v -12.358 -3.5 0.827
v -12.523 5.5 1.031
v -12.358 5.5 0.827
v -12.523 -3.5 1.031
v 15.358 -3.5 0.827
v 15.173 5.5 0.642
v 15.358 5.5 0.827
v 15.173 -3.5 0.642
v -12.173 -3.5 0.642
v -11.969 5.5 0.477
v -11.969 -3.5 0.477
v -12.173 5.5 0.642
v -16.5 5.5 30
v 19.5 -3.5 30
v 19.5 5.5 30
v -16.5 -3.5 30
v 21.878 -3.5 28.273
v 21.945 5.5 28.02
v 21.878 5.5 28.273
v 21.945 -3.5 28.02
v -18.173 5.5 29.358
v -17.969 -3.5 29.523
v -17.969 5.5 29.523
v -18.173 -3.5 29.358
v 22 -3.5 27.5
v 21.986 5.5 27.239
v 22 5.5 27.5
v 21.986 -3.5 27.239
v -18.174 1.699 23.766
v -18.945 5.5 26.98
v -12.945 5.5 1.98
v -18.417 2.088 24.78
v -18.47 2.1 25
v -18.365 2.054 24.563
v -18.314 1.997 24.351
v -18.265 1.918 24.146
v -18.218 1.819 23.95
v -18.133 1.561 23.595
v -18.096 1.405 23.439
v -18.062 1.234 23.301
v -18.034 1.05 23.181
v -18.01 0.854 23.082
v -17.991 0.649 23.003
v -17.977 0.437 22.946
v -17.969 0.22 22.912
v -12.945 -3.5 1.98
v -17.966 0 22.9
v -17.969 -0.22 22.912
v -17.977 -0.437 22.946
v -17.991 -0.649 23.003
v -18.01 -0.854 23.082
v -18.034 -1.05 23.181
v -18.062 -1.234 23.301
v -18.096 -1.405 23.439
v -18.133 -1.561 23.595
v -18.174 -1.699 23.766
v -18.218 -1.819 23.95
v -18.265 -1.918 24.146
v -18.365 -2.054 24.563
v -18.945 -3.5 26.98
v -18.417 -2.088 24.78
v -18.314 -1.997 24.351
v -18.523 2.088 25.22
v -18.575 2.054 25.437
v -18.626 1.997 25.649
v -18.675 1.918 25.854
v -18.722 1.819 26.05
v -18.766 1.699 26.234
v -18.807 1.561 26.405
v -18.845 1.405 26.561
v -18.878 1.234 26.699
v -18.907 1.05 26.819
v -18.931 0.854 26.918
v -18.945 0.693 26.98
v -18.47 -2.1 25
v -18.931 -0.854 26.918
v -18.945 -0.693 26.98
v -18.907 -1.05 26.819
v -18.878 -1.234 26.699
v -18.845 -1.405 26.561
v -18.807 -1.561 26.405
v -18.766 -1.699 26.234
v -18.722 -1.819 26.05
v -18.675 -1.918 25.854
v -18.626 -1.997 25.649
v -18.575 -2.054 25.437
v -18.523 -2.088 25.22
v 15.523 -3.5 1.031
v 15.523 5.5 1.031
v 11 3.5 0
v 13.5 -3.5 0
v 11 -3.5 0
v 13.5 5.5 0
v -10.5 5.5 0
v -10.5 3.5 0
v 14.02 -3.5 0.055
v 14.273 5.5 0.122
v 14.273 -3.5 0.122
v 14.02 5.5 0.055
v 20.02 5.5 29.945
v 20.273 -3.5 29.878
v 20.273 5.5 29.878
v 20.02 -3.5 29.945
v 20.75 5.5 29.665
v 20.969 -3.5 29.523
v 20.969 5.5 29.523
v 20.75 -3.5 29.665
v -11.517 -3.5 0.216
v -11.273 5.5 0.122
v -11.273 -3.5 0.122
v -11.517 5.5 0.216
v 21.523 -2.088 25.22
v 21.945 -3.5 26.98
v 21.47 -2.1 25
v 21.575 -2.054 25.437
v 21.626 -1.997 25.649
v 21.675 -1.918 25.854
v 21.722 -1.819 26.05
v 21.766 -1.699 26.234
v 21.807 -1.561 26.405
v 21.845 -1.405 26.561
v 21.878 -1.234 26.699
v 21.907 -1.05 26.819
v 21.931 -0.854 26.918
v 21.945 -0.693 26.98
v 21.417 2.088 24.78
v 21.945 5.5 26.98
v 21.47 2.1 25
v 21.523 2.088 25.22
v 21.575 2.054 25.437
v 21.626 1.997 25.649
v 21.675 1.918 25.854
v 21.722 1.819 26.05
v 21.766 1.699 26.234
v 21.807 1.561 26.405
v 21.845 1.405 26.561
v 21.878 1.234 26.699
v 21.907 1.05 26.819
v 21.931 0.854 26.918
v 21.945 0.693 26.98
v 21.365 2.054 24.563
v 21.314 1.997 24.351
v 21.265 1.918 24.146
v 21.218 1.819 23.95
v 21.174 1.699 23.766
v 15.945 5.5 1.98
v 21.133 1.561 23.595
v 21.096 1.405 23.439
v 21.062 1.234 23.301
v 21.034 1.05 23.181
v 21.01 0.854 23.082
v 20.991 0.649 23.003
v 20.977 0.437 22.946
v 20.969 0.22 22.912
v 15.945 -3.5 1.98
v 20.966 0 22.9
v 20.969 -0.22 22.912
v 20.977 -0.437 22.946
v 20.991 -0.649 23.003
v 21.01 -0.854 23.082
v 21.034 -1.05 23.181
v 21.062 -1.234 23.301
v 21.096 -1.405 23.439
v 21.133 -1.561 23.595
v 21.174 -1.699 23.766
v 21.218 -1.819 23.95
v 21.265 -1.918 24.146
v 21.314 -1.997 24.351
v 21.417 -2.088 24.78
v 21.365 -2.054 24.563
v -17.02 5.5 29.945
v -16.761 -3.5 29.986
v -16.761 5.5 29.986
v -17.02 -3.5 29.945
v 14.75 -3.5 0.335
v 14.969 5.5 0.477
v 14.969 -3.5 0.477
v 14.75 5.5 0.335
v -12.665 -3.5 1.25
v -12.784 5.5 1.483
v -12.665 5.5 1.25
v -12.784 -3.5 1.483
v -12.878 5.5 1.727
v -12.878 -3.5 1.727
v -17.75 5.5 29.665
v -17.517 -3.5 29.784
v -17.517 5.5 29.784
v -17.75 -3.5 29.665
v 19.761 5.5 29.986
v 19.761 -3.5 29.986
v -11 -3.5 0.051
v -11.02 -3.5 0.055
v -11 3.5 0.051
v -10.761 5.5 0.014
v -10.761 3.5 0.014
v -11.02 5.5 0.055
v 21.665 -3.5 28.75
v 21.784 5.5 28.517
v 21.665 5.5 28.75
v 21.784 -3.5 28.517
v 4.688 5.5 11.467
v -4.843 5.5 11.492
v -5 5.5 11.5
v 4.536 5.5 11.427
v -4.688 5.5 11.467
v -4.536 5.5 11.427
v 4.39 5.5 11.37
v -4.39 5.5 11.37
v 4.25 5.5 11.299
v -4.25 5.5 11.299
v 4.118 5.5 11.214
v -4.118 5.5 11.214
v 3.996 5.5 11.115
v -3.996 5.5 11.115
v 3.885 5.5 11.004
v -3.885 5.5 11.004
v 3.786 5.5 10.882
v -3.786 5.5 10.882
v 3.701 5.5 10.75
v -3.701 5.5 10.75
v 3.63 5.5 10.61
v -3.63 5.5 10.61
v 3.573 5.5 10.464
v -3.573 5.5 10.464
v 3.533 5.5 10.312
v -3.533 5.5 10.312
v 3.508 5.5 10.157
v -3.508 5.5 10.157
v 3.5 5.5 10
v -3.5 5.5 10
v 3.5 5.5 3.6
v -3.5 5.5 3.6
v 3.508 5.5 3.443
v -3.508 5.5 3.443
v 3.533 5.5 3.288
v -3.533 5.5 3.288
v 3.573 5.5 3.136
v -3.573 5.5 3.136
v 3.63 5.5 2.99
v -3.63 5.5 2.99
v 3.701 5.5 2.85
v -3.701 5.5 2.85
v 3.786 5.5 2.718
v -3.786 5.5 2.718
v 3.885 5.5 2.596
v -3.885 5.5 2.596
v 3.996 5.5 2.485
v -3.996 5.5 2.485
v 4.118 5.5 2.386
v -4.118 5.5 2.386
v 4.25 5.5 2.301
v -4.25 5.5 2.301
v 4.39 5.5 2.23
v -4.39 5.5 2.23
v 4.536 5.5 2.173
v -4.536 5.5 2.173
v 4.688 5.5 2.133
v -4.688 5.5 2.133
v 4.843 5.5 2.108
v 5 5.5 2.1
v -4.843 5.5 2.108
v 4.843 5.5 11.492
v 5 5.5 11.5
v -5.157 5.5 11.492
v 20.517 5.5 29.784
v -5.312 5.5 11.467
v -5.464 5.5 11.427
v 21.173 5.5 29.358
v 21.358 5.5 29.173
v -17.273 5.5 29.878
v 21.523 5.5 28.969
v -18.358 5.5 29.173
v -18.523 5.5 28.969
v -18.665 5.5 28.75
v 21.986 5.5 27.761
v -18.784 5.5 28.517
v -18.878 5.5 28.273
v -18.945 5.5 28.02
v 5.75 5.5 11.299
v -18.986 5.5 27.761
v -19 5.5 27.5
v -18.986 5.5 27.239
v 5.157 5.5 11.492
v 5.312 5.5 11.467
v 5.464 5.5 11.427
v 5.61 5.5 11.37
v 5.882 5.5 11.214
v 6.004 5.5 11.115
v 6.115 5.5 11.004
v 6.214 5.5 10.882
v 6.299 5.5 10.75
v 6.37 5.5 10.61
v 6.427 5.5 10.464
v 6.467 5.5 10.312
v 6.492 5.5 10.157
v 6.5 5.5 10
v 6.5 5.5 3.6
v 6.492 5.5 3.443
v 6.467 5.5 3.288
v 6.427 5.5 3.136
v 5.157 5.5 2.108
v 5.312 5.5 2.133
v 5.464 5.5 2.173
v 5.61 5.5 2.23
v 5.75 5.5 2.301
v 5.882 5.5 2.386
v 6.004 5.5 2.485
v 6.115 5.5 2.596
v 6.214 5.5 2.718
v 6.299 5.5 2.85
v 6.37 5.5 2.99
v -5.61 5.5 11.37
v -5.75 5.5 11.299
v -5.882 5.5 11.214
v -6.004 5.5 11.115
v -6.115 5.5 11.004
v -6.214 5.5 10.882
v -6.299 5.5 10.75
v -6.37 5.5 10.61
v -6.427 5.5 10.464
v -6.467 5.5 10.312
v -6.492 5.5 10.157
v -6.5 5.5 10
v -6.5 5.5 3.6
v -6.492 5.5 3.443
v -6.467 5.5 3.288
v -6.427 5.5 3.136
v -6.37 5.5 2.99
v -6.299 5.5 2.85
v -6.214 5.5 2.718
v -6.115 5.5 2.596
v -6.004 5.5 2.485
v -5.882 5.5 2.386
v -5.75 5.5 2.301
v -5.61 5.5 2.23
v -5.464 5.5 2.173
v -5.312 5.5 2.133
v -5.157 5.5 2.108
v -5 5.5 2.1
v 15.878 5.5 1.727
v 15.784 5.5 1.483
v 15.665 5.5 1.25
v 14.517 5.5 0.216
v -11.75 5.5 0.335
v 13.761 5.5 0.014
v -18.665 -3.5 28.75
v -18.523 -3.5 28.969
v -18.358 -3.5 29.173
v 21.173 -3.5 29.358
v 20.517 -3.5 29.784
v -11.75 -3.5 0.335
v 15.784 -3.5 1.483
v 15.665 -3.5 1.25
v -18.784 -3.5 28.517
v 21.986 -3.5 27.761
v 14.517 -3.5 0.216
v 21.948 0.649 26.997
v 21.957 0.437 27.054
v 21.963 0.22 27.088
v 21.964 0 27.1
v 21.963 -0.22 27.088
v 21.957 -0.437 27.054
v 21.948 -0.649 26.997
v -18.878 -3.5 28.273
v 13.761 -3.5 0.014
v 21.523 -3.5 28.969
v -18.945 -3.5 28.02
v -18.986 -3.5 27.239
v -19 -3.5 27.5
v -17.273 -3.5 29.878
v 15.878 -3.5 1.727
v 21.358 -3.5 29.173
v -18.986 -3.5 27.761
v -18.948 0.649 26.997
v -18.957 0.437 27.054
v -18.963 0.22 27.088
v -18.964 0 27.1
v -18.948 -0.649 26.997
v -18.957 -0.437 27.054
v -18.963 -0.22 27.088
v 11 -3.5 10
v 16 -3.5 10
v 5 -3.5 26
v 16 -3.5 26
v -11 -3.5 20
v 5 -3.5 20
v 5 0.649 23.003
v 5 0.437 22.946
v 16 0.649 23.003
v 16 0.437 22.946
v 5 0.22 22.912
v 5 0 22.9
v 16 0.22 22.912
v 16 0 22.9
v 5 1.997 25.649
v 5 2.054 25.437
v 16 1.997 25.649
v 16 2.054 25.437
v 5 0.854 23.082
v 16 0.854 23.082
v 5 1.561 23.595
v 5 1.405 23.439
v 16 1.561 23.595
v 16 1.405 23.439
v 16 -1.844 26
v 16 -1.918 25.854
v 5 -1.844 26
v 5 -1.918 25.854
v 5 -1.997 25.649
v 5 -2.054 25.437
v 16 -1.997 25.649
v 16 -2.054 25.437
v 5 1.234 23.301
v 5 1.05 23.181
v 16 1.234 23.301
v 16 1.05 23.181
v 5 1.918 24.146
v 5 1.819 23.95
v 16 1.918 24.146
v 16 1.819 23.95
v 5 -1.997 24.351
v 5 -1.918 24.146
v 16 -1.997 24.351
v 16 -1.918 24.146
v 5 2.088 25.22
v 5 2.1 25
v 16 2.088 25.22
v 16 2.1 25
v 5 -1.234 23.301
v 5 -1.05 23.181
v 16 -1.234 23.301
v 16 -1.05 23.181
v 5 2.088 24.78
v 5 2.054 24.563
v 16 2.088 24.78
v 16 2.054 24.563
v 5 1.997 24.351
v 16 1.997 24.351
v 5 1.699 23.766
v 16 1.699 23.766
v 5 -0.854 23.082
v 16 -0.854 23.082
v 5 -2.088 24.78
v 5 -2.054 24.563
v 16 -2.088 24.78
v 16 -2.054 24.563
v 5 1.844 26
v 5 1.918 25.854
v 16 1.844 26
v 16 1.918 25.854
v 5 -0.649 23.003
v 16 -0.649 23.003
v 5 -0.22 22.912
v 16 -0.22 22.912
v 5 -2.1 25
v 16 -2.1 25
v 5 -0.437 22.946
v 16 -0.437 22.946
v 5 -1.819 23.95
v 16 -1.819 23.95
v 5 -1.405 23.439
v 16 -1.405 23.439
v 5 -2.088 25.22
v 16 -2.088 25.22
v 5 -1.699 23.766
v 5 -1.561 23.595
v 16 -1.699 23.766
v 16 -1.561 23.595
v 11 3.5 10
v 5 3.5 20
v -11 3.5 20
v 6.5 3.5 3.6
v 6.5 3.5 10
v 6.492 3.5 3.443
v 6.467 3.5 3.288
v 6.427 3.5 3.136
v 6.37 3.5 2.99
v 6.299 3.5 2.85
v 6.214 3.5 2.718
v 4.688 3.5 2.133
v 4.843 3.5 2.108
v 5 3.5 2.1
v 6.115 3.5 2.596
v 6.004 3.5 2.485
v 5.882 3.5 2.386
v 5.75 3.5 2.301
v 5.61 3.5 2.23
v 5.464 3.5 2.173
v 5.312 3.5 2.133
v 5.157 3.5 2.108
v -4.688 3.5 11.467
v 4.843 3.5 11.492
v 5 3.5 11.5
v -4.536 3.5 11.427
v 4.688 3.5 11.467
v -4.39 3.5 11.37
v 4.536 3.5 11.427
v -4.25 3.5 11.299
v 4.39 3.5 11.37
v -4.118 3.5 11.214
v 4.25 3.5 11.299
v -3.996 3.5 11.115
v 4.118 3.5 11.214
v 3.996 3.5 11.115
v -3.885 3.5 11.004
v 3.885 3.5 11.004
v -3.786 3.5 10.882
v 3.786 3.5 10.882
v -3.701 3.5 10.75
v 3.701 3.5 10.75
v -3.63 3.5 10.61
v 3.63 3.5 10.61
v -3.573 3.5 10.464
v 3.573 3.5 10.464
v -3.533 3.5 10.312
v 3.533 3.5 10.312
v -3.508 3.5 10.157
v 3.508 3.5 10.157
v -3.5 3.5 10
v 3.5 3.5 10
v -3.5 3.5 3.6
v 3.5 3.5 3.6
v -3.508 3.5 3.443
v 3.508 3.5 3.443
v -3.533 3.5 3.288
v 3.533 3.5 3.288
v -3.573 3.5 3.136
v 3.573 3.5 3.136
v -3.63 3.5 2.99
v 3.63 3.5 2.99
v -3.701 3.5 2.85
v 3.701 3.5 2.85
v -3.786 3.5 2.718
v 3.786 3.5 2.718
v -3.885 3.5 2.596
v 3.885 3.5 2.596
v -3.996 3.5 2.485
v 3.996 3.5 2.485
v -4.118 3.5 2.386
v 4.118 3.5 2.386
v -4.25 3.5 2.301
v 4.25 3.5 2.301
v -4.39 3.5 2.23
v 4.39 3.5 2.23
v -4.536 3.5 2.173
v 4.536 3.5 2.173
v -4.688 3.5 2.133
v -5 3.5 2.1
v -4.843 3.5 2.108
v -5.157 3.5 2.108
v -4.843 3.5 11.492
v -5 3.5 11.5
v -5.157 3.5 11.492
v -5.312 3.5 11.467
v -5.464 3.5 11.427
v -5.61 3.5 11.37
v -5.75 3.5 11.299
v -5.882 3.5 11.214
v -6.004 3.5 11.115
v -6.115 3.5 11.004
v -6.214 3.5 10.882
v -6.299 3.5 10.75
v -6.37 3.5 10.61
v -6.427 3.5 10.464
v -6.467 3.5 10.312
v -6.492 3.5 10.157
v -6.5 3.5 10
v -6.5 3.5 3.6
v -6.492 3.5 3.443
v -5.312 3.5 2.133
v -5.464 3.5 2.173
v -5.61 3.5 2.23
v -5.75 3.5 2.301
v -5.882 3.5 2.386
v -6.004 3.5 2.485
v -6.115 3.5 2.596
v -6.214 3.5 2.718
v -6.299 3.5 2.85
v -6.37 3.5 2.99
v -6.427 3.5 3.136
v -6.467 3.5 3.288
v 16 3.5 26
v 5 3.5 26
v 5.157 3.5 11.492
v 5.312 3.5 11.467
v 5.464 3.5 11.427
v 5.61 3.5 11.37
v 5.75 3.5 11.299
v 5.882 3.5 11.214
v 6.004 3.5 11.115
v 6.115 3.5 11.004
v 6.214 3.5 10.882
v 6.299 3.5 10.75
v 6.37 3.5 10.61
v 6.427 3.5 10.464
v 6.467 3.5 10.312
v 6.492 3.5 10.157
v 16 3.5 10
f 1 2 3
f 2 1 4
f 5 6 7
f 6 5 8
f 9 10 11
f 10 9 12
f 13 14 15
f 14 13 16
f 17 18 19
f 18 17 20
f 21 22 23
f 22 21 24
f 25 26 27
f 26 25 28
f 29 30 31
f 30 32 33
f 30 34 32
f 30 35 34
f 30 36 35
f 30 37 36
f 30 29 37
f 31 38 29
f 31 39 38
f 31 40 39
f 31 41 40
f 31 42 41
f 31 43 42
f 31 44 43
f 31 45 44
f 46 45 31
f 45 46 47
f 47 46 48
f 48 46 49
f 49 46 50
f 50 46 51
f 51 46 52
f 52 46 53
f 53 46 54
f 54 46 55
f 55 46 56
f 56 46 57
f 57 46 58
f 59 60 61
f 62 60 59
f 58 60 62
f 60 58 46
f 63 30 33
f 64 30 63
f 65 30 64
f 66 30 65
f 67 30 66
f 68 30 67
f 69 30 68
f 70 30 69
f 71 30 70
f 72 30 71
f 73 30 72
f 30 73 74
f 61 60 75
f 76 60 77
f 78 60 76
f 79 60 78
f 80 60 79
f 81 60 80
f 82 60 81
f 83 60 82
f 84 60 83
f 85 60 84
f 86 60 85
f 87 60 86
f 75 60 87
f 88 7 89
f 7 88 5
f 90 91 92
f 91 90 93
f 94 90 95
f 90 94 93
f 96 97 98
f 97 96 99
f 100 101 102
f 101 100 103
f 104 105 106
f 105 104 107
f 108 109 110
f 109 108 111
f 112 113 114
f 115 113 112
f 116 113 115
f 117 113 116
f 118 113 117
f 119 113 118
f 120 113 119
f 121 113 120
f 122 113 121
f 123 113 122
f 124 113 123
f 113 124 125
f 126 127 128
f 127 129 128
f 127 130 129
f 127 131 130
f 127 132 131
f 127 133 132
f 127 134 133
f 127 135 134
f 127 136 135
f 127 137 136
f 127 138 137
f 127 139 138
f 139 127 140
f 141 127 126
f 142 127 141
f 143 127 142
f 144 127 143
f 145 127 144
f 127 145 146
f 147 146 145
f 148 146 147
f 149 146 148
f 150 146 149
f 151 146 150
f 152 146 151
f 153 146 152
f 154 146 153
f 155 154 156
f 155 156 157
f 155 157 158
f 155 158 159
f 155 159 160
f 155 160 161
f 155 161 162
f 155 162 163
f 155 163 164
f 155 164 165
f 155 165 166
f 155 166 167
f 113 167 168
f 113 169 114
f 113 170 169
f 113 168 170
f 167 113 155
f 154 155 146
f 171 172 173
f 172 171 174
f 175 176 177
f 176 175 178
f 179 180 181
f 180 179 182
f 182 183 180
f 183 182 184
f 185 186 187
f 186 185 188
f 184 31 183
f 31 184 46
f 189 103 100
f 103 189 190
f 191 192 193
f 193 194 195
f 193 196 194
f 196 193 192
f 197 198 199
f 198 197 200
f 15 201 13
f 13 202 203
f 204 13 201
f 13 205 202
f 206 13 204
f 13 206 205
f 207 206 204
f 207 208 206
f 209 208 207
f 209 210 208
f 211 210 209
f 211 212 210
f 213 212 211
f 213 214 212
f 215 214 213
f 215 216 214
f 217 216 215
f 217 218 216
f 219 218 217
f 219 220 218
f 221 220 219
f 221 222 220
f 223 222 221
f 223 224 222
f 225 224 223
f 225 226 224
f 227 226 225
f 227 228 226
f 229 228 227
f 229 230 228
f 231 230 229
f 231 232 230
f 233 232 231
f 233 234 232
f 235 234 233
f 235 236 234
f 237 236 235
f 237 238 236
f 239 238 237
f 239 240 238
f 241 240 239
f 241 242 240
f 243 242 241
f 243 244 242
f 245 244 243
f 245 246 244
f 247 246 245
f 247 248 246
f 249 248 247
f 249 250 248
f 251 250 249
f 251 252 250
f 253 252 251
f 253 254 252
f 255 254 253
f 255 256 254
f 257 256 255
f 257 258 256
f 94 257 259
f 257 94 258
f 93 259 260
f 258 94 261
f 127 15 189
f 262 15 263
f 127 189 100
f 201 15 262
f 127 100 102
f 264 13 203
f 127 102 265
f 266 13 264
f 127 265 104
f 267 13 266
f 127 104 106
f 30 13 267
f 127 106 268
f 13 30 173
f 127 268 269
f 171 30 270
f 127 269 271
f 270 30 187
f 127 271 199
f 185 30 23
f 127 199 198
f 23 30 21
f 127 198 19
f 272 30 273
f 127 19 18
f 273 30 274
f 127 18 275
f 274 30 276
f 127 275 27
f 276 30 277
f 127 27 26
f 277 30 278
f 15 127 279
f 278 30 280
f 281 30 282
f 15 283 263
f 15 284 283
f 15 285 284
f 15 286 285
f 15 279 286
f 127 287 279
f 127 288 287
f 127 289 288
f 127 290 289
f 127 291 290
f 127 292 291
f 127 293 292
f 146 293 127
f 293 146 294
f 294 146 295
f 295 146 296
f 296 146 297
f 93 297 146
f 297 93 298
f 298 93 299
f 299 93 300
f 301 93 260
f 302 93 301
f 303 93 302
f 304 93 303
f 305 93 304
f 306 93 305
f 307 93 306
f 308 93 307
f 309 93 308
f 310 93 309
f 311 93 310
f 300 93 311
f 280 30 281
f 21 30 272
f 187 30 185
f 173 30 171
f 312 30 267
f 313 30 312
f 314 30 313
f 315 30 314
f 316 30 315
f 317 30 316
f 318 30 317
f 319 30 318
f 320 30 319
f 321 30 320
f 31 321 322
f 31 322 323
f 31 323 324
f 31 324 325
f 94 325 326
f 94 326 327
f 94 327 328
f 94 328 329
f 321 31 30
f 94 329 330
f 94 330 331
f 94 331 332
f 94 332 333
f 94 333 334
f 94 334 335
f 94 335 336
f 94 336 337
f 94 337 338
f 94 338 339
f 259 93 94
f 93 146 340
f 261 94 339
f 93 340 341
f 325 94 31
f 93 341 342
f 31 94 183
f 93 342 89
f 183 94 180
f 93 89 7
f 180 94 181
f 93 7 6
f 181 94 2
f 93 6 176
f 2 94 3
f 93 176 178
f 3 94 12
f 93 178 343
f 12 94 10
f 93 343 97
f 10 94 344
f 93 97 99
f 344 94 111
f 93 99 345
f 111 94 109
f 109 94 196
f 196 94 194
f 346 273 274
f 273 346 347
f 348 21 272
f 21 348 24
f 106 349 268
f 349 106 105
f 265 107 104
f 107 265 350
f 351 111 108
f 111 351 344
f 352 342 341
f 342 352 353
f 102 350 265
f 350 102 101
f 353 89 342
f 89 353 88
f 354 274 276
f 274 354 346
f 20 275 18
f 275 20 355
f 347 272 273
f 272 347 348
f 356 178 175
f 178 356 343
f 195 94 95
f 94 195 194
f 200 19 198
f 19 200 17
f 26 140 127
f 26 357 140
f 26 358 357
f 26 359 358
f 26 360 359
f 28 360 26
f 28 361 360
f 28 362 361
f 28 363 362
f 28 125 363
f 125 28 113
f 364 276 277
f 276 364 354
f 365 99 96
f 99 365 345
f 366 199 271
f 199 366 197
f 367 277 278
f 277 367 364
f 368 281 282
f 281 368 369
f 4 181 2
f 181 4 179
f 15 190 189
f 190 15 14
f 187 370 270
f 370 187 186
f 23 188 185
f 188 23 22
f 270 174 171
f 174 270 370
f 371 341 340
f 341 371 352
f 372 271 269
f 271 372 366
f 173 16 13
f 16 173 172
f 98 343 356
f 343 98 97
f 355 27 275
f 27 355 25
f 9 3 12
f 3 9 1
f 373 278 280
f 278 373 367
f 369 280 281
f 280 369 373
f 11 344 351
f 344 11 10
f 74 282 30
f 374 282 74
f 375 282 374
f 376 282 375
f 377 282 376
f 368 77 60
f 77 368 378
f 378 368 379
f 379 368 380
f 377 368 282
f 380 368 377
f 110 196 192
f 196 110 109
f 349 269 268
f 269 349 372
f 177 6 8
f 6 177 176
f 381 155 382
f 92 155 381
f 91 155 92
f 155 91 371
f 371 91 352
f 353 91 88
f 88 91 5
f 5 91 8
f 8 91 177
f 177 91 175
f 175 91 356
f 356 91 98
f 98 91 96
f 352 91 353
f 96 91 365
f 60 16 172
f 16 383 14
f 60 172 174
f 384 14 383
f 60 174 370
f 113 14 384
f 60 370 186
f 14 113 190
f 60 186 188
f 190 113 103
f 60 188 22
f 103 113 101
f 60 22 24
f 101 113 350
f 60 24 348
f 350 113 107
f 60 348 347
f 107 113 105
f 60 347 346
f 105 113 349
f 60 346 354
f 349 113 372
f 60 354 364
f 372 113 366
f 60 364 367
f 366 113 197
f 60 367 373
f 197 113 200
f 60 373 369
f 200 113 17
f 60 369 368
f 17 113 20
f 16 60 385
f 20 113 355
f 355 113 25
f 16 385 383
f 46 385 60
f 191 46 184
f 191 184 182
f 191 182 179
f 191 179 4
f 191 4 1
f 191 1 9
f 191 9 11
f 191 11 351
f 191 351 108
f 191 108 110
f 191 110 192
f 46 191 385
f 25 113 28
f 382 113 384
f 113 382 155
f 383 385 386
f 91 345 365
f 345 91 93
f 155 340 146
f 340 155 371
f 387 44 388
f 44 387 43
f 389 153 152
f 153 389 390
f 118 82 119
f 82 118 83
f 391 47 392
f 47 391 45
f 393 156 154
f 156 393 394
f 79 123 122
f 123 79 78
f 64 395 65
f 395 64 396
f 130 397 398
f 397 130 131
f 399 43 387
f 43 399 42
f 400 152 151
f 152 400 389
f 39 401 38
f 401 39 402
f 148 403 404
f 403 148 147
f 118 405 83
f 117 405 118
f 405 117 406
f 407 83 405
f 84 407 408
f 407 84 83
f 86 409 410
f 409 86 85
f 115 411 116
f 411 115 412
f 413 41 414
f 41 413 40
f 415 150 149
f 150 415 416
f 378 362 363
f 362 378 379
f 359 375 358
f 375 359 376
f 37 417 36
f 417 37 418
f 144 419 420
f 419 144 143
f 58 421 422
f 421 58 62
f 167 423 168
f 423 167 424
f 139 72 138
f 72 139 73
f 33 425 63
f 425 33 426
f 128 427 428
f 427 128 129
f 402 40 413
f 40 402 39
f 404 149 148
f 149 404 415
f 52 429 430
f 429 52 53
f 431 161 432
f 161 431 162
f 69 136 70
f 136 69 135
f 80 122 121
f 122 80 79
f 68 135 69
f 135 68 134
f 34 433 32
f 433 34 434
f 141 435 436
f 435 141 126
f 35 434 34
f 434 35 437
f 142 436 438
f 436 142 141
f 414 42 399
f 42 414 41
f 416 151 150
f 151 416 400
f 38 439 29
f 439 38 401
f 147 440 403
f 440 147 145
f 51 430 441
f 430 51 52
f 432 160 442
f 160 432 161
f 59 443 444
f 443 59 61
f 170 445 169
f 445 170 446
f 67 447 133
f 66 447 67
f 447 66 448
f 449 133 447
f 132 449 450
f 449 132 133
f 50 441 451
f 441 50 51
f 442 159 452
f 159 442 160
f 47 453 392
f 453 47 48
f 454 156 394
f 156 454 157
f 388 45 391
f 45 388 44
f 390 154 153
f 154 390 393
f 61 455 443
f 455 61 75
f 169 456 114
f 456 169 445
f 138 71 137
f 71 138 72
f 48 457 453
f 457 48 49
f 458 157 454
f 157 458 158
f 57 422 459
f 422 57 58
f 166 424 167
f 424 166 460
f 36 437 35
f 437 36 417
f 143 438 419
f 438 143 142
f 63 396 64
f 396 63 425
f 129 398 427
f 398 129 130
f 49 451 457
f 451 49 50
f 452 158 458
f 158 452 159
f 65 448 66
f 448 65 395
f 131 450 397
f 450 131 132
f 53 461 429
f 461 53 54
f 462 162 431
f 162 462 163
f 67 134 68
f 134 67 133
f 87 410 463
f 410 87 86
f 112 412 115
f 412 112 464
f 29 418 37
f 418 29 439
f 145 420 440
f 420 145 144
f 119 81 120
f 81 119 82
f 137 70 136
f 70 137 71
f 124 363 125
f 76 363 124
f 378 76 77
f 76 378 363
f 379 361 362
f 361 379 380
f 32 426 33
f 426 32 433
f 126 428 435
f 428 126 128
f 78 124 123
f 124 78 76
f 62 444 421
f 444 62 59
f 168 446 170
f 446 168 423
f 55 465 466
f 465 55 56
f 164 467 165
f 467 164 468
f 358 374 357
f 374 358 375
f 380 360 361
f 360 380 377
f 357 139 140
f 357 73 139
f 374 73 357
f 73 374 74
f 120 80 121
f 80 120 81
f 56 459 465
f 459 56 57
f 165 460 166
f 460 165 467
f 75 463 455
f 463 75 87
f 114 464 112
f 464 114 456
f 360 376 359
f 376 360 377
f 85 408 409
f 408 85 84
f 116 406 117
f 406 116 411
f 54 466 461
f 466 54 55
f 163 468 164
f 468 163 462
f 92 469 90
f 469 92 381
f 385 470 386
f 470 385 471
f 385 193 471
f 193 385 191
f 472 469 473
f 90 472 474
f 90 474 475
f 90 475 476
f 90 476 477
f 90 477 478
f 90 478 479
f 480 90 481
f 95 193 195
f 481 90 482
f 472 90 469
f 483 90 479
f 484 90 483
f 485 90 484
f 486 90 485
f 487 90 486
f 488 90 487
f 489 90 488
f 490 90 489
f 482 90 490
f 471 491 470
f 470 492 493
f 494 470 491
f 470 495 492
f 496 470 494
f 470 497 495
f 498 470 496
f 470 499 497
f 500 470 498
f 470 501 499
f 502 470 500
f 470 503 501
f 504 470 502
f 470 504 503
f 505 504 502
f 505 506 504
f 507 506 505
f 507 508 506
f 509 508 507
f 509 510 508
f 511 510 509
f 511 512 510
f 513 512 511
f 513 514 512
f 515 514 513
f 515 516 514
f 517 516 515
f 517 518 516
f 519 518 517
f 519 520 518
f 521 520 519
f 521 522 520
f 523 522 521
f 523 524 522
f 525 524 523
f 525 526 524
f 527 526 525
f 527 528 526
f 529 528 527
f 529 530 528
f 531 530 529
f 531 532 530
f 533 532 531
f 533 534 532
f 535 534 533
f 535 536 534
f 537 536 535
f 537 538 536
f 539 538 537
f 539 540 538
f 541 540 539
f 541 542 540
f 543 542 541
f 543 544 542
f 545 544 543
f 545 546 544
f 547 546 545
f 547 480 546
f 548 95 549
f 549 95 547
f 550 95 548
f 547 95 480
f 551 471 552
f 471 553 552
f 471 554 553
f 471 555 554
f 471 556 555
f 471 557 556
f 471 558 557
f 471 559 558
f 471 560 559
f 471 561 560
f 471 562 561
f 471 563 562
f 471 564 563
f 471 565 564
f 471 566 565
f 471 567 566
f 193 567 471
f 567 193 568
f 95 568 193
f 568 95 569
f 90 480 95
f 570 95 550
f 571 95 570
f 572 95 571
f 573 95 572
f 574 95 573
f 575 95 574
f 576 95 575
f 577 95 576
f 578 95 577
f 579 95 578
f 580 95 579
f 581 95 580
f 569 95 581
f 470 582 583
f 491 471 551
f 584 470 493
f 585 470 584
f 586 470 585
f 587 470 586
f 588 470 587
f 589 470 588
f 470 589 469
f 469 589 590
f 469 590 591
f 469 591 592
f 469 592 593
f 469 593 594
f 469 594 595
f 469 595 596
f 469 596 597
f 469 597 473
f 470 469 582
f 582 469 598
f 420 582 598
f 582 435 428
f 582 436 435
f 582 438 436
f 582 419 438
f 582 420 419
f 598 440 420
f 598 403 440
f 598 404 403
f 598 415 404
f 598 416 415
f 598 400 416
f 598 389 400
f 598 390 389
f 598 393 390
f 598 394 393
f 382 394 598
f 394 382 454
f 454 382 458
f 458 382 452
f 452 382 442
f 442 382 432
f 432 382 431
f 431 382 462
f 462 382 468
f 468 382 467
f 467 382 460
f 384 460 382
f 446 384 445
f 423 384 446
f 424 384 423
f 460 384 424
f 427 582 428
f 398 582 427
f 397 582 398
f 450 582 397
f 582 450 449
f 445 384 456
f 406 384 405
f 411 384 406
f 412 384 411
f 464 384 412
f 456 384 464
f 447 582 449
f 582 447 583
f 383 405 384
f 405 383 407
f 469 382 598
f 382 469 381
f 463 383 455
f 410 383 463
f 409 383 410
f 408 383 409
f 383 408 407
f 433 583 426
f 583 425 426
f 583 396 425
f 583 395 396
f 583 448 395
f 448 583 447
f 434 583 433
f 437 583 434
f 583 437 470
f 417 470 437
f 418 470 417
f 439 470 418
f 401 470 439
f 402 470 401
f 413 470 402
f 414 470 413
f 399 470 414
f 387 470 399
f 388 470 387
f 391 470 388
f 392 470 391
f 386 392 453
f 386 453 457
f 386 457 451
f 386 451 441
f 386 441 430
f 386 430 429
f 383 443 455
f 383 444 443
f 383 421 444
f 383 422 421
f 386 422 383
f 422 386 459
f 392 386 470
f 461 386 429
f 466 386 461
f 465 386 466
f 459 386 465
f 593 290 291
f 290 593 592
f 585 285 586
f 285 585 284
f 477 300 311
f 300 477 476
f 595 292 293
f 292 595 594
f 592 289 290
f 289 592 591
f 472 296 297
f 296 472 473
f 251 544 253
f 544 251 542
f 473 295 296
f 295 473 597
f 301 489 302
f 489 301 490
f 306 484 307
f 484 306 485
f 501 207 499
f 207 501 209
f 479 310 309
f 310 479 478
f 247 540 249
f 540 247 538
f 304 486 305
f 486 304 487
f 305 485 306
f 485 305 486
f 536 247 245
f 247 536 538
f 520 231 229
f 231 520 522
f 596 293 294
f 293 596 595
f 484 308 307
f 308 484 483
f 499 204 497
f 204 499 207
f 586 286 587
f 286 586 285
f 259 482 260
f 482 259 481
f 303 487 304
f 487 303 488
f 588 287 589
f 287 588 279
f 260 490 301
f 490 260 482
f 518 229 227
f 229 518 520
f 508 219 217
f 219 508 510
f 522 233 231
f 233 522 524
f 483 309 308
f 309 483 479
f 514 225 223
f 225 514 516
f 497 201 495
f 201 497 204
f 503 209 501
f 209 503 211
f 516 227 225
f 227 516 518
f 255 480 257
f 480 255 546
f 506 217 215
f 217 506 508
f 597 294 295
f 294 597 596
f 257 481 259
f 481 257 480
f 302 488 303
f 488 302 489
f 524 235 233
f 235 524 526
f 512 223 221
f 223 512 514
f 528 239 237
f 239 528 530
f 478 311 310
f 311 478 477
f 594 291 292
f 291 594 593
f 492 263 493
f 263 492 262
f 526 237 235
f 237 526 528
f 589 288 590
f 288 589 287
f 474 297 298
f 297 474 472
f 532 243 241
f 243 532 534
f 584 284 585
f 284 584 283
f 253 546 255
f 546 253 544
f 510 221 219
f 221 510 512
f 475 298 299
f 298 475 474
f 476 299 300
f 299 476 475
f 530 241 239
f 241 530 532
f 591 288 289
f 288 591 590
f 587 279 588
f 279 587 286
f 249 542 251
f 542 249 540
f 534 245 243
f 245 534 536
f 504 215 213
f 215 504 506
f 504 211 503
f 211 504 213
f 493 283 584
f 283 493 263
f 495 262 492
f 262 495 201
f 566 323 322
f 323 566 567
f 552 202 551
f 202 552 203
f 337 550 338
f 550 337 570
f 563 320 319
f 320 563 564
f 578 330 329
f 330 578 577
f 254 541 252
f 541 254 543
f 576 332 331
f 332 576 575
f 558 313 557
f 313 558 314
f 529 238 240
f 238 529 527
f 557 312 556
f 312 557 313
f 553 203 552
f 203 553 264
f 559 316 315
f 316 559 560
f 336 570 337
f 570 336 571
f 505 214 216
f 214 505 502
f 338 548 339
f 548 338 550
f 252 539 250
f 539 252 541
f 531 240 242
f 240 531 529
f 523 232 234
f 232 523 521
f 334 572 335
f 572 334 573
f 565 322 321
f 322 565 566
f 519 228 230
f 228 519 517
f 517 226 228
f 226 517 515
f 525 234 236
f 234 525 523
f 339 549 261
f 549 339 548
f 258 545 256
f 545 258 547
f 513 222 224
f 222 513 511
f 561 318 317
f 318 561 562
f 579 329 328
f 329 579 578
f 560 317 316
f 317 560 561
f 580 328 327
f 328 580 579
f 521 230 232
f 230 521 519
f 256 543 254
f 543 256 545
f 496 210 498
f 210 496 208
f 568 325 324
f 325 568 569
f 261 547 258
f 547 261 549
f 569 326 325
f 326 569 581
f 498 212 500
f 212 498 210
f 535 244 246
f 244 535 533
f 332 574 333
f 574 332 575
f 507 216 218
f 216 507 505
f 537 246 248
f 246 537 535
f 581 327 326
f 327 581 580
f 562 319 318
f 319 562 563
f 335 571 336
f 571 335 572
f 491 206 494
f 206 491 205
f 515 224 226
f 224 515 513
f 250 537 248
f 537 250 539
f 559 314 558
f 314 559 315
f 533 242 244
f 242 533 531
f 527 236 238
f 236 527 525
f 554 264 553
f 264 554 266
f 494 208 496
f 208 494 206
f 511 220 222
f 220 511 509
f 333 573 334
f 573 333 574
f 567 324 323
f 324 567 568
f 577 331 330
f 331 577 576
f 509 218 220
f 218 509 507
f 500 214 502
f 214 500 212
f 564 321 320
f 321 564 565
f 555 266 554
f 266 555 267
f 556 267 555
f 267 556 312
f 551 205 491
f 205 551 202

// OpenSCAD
//
// Copyright 2019 Barrett Ford <https://www.thingiverse.com/barrettford/about>
//
// https://www.thingiverse.com/thing:3052714
//

$fa=.5;
$fs=1;
$fn=60;

module switch() {
  difference() {
    union() {
      translate([0,-3.3,0]) cube([10, 6.6, 9.5]);
      translate([-10,-3.3,0]) cube([10, 6.6, 10.3]);
      
      translate([-7,-3.3,10.5]) rotate([0,70,0]) cube([7, 6.6, 21]);
    }
    translate([5, 4, 2.6]) rotate([90,0,0]) cylinder(d=3,h=8);
    translate([-5, 4, 2.6]) rotate([90,0,0]) cylinder(d=3,h=8);
  }
  hull() {
    translate([10.7 , 3.3, 15.5]) rotate([90,0,0]) cylinder(d=5,h=6.6);
    translate([10.35, 3.3, 17.0]) rotate([90,0,0]) cylinder(d=5,h=6.6);
    translate([10.0 , 3.3, 18.5]) rotate([90,0,0]) cylinder(d=5,h=6.6);
    translate([9.65 , 3.3, 19.5]) rotate([90,0,0]) cylinder(d=5,h=6.6);
  }
}


module bottom() {
  height = 9;
  tube_diameter = 4.2;
  difference() {
    union() {
      translate([1.5,0,0]) hull()
      {
        translate([-12,5.5,2.5])  rotate([90,0,0]) cylinder(d=5, h=height);
        translate([ 12,5.5,2.5])  rotate([90,0,0]) cylinder(d=5, h=height);
        translate([-18,5.5,27.5]) rotate([90,0,0]) cylinder(d=5, h=height);
        translate([ 18,5.5,27.5]) rotate([90,0,0]) cylinder(d=5, h=height);
        
      }
    }
    translate([-25,0,25]) rotate([0,90,0]) cylinder(d=tube_diameter, h=50);
    translate([-11,-6.5,-1]) cube([22, 10, 21]);
    translate([ 5,-6.5, 10]) cube([11, 10, 16]);
    
    hull() {
      translate([5, 6, 3.6]) rotate([90,0,0]) cylinder(d=3,h=20);
      translate([5, 6, 10]) rotate([90,0,0]) cylinder(d=3,h=20);
    }
    
    hull() {
      translate([-5, 6, 3.6]) rotate([90,0,0]) cylinder(d=3,h=20);
      translate([-5, 6, 10]) rotate([90,0,0]) cylinder(d=3,h=20);
    }
  }
}

// Uncomment this line to see where the switch would fit
//translate([0,0,5]) #switch();
bottom();
